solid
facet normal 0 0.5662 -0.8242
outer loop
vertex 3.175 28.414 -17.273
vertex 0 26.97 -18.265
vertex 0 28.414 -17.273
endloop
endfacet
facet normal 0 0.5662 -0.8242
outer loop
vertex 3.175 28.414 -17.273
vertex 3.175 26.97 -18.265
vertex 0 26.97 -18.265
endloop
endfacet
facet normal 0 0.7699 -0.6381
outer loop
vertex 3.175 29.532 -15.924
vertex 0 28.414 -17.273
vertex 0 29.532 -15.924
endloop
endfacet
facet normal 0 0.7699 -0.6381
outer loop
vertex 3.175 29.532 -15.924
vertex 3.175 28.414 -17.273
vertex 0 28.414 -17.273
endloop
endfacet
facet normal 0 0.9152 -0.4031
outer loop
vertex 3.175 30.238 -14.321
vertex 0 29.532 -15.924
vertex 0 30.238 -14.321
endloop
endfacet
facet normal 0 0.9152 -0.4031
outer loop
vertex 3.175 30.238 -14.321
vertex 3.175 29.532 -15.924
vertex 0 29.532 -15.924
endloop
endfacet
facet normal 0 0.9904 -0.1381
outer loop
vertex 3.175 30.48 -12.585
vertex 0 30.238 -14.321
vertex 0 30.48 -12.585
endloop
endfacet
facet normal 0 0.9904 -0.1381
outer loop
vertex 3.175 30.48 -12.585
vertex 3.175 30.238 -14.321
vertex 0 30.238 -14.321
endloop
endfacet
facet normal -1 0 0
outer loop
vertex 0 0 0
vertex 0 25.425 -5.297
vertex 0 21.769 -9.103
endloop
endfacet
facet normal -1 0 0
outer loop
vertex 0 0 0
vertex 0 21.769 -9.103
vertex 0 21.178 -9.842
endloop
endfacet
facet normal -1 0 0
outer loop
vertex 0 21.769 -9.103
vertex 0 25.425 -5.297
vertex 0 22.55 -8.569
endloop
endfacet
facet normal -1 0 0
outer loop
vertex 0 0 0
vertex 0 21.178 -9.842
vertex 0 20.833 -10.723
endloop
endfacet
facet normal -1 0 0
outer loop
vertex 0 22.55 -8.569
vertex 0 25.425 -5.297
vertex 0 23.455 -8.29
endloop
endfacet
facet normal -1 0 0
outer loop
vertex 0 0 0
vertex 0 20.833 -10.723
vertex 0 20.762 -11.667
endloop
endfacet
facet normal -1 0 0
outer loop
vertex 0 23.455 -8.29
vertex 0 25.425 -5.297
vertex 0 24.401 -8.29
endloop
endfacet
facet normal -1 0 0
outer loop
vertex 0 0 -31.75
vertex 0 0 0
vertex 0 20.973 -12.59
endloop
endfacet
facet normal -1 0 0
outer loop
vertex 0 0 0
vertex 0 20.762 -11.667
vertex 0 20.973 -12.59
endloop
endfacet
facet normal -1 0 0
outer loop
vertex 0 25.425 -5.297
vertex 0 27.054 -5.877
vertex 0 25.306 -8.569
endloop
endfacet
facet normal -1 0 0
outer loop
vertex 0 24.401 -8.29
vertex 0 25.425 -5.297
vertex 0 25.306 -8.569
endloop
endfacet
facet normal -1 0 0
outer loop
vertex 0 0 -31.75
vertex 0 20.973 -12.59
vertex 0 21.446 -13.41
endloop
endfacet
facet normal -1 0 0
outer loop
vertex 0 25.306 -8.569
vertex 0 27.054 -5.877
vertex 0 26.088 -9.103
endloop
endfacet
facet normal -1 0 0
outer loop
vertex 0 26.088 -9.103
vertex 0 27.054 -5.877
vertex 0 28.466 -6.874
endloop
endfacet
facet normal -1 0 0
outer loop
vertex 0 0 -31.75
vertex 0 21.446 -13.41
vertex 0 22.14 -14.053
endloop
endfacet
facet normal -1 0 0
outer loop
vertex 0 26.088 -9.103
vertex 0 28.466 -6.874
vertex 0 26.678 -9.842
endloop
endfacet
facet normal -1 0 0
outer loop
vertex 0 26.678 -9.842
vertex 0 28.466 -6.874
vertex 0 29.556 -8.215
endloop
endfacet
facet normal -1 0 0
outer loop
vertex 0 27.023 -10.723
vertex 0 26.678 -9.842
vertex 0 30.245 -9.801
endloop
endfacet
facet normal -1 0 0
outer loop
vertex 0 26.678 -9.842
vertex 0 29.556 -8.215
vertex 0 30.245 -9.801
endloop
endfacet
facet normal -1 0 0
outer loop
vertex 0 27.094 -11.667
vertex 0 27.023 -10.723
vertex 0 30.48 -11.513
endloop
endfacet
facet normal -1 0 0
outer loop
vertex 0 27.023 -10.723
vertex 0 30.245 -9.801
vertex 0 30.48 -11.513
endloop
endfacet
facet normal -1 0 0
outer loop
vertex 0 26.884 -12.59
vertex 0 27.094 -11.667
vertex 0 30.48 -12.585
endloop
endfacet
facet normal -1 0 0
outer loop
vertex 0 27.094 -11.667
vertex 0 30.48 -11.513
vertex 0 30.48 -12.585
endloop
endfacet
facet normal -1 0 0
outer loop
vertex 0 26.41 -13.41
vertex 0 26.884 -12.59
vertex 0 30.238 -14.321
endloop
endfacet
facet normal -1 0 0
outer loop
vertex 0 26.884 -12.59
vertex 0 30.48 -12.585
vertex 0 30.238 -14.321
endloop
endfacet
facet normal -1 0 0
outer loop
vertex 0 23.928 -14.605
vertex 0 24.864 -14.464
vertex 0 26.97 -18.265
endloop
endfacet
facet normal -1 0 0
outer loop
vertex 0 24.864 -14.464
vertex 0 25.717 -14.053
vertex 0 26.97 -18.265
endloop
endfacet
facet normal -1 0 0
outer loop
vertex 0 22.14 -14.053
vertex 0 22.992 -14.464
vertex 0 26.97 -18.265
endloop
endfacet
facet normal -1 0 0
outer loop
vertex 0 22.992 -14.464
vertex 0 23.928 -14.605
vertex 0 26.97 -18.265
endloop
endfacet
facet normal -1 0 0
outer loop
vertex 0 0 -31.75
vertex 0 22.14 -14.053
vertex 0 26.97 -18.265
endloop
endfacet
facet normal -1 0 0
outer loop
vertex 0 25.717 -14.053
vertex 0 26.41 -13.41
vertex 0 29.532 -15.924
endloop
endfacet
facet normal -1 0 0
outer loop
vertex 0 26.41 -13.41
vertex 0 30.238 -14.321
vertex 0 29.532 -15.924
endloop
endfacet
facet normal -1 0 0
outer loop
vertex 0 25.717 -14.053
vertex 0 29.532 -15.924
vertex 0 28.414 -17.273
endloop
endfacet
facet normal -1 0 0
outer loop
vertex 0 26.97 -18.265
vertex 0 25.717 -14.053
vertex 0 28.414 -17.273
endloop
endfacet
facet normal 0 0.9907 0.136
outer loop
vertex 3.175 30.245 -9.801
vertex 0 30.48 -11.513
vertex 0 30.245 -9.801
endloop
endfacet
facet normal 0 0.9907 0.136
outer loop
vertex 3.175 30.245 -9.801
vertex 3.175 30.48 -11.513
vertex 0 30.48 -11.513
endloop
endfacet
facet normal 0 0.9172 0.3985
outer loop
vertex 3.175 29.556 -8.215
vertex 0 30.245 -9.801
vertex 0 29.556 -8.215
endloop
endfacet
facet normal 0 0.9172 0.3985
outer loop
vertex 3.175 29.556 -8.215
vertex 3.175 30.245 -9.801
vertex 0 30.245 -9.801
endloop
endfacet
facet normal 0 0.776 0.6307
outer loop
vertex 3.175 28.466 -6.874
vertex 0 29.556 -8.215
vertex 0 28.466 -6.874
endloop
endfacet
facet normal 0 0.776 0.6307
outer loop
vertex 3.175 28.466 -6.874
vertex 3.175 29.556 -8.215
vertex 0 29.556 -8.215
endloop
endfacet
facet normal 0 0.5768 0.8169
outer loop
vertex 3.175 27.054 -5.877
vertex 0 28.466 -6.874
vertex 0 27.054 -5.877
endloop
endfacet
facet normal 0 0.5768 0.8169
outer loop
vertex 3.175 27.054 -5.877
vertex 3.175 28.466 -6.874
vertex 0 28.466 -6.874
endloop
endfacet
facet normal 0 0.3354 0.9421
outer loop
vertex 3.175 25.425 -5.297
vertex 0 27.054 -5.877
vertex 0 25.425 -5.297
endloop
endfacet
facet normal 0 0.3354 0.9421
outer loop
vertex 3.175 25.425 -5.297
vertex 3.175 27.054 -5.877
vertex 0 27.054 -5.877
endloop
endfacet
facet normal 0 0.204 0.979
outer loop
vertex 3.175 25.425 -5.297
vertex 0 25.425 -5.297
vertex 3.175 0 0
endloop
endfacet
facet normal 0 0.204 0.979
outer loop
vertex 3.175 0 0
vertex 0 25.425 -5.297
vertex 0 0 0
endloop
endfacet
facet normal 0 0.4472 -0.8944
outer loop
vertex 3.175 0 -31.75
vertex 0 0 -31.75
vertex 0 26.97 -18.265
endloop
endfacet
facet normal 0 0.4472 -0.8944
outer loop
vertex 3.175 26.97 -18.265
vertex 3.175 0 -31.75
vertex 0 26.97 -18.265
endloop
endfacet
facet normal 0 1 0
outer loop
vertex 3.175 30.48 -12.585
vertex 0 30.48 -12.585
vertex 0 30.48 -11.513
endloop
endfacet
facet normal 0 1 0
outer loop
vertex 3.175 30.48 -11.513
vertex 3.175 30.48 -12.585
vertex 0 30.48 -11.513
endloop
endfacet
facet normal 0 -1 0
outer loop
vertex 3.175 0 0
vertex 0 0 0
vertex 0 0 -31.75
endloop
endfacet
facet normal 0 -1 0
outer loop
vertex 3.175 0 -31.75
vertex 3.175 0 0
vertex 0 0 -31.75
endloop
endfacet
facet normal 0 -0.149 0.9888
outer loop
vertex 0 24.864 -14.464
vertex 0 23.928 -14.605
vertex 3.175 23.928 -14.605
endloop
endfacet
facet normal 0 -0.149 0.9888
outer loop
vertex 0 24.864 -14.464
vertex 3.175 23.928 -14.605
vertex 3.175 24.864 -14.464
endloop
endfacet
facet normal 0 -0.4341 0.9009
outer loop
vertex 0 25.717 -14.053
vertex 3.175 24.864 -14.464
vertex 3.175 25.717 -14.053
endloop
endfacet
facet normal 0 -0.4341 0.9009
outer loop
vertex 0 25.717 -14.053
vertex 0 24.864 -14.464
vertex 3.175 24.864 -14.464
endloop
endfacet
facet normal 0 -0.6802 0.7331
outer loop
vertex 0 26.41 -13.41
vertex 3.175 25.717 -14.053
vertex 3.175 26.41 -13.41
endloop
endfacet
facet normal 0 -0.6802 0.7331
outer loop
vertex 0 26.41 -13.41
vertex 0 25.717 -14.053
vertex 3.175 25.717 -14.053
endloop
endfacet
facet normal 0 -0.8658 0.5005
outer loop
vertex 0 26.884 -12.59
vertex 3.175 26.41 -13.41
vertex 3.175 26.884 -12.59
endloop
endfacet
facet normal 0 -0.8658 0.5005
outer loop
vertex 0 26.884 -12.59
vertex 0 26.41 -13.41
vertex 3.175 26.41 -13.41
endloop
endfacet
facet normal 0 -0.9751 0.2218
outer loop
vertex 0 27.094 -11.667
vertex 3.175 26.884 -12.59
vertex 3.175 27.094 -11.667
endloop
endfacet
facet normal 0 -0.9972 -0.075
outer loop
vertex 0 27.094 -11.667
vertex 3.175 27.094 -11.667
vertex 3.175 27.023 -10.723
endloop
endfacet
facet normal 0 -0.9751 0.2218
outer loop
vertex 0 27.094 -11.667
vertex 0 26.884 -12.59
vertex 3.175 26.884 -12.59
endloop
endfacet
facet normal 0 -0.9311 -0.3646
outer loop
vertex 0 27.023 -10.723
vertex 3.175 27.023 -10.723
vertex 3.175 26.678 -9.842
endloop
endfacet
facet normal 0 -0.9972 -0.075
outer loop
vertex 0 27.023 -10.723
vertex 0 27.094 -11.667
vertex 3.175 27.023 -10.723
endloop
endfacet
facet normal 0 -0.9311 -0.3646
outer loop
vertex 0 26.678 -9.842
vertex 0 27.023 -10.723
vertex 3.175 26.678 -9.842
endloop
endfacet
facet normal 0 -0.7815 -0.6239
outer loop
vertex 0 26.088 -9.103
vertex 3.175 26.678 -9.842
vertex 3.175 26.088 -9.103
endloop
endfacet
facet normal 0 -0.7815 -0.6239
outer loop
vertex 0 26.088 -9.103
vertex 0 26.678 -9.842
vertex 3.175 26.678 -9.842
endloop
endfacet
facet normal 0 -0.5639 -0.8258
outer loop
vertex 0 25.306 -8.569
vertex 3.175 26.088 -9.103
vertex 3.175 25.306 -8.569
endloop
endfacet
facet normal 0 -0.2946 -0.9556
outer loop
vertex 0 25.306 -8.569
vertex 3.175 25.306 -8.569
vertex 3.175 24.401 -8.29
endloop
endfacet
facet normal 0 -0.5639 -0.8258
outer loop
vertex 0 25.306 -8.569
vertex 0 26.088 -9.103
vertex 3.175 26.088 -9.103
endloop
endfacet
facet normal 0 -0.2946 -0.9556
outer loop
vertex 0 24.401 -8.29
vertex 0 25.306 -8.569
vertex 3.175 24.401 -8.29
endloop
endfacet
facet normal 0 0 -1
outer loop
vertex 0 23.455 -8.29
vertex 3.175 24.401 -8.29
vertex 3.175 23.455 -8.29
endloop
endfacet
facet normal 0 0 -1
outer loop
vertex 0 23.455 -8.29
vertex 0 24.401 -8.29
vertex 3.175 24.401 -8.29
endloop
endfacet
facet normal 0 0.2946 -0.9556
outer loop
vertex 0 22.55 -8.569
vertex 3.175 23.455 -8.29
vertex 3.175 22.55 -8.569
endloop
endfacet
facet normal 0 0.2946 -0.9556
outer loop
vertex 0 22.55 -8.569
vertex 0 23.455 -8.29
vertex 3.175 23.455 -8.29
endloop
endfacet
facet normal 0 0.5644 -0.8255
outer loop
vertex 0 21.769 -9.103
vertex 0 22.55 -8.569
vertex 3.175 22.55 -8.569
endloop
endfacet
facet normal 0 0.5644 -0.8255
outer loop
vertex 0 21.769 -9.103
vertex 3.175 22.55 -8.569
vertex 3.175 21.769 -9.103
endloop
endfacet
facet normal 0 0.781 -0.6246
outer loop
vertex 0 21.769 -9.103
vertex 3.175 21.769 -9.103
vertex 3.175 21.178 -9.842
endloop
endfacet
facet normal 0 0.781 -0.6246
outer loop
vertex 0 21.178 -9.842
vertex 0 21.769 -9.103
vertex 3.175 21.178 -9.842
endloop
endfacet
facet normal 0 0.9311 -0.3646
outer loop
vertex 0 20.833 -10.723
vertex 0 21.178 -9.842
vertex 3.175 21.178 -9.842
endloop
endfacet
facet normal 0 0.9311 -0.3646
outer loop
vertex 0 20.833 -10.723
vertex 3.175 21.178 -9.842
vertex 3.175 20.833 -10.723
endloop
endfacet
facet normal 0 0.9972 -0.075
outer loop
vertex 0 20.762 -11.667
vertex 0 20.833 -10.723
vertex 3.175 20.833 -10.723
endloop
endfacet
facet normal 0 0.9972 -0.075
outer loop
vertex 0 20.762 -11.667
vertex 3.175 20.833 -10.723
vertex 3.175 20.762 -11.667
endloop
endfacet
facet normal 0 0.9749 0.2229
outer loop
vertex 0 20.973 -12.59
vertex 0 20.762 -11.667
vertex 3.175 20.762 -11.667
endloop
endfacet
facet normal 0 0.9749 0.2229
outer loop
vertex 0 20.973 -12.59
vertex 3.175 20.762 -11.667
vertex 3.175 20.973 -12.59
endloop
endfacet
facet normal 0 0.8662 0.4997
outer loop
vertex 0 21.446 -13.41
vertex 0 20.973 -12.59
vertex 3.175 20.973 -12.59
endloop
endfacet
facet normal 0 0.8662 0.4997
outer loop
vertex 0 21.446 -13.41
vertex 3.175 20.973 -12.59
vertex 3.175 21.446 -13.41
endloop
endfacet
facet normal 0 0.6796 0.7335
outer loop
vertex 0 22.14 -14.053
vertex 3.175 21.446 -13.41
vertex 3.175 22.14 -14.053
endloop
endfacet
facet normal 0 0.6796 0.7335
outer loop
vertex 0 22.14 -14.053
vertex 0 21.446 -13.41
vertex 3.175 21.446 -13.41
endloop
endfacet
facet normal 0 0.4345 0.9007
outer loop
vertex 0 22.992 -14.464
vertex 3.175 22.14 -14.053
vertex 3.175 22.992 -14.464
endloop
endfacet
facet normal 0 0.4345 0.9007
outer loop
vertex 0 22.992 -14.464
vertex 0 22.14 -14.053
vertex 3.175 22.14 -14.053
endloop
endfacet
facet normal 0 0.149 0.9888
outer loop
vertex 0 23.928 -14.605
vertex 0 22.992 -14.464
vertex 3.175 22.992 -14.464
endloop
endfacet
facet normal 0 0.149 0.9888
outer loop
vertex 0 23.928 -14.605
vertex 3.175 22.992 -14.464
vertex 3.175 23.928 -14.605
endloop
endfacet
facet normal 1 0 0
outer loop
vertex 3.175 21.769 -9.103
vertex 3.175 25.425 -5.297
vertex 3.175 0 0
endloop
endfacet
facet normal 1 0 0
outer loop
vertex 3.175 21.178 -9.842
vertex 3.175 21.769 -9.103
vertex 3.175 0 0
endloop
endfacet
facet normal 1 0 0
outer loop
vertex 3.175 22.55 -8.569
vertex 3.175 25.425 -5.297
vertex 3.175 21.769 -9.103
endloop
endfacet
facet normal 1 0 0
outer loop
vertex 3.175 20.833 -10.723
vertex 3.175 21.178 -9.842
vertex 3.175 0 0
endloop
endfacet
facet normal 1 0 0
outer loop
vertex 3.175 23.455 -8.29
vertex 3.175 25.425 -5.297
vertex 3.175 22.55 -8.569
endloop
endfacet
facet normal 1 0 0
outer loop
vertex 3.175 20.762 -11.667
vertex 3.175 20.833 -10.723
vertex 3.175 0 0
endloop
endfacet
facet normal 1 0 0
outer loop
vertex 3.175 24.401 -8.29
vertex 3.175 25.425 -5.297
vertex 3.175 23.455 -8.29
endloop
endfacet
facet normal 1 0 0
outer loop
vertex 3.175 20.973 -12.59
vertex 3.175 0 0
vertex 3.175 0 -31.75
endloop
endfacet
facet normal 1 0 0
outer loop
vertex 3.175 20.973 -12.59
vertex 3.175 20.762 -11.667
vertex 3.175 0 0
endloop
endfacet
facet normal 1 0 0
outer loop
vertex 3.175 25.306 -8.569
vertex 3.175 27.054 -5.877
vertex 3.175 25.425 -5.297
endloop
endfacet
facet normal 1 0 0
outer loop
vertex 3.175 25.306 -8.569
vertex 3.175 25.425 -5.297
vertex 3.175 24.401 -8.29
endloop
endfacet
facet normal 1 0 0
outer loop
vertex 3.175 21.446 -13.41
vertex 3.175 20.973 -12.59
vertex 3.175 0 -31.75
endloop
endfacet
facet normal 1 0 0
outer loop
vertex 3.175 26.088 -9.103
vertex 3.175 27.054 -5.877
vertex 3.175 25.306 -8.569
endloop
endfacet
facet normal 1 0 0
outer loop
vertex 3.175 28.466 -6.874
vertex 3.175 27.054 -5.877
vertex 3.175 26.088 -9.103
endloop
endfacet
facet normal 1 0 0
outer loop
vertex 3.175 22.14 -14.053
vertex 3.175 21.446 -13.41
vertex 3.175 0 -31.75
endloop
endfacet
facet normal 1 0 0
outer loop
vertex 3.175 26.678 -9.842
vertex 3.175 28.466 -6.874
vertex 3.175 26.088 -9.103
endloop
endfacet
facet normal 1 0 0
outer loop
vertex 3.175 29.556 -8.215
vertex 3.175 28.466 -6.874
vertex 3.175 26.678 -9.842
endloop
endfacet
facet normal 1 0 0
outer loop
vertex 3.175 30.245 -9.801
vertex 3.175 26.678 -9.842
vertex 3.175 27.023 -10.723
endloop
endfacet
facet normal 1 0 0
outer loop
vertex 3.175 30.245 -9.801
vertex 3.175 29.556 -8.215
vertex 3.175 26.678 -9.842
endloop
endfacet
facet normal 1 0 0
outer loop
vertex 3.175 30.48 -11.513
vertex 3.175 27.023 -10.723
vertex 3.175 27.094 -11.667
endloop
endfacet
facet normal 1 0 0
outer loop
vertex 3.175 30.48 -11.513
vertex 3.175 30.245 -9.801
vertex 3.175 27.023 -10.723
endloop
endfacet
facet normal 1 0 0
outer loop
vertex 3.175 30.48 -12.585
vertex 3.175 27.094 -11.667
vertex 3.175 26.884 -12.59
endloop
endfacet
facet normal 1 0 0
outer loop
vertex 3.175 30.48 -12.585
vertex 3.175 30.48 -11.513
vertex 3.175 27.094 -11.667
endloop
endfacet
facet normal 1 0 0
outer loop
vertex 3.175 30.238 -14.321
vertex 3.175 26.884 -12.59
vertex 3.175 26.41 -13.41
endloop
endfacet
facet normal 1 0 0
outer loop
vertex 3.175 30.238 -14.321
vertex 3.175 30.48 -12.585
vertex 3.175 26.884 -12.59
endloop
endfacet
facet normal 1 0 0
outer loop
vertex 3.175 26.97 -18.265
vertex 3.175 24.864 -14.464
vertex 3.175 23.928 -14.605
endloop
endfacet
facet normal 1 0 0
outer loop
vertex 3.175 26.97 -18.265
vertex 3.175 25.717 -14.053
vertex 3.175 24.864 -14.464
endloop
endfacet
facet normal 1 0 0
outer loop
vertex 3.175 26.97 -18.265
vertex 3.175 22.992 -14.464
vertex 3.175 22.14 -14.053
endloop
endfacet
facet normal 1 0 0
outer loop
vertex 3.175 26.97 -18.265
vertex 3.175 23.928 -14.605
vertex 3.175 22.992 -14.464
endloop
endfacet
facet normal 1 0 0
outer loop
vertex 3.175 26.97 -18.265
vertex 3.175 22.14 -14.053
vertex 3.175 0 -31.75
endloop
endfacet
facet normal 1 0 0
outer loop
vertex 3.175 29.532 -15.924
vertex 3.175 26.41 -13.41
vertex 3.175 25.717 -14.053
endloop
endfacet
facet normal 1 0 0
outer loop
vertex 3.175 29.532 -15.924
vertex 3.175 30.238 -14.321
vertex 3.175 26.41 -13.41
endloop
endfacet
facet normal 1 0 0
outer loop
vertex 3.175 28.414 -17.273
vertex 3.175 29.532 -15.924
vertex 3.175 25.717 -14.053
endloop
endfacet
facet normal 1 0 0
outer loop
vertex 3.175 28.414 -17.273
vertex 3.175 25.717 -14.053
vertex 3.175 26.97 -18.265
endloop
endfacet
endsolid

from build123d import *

# Parameters (mm, degrees)
SKETCH1_R           = 3.175
BOSS_EXTRUDE1_DEPTH = 3.175
FILLET2_R           = 6.35


with BuildPart() as part:
    # Sketch1 → Boss-Extrude1 (new body)
    with BuildSketch(Plane(origin=(0, 0, 0), x_dir=(0, 0, -1), z_dir=(1, 0, 0))):
        Polygon((31.75, 0), (16.51, 30.48), (6.35, 30.48), (0, 0), align=None)
        with Locations((11.43, 23.92807)):
            Circle(SKETCH1_R, mode=Mode.SUBTRACT)
    extrude(amount=BOSS_EXTRUDE1_DEPTH)

    # Fillet2
    fillet2_edges = [part.edges().sort_by_distance(p)[0] for p in [
        (1.5875, 30.48, -6.35),
        (1.5875, 30.48, -16.51),
    ]]
    fillet(fillet2_edges, radius=FILLET2_R)


solid = part.part
